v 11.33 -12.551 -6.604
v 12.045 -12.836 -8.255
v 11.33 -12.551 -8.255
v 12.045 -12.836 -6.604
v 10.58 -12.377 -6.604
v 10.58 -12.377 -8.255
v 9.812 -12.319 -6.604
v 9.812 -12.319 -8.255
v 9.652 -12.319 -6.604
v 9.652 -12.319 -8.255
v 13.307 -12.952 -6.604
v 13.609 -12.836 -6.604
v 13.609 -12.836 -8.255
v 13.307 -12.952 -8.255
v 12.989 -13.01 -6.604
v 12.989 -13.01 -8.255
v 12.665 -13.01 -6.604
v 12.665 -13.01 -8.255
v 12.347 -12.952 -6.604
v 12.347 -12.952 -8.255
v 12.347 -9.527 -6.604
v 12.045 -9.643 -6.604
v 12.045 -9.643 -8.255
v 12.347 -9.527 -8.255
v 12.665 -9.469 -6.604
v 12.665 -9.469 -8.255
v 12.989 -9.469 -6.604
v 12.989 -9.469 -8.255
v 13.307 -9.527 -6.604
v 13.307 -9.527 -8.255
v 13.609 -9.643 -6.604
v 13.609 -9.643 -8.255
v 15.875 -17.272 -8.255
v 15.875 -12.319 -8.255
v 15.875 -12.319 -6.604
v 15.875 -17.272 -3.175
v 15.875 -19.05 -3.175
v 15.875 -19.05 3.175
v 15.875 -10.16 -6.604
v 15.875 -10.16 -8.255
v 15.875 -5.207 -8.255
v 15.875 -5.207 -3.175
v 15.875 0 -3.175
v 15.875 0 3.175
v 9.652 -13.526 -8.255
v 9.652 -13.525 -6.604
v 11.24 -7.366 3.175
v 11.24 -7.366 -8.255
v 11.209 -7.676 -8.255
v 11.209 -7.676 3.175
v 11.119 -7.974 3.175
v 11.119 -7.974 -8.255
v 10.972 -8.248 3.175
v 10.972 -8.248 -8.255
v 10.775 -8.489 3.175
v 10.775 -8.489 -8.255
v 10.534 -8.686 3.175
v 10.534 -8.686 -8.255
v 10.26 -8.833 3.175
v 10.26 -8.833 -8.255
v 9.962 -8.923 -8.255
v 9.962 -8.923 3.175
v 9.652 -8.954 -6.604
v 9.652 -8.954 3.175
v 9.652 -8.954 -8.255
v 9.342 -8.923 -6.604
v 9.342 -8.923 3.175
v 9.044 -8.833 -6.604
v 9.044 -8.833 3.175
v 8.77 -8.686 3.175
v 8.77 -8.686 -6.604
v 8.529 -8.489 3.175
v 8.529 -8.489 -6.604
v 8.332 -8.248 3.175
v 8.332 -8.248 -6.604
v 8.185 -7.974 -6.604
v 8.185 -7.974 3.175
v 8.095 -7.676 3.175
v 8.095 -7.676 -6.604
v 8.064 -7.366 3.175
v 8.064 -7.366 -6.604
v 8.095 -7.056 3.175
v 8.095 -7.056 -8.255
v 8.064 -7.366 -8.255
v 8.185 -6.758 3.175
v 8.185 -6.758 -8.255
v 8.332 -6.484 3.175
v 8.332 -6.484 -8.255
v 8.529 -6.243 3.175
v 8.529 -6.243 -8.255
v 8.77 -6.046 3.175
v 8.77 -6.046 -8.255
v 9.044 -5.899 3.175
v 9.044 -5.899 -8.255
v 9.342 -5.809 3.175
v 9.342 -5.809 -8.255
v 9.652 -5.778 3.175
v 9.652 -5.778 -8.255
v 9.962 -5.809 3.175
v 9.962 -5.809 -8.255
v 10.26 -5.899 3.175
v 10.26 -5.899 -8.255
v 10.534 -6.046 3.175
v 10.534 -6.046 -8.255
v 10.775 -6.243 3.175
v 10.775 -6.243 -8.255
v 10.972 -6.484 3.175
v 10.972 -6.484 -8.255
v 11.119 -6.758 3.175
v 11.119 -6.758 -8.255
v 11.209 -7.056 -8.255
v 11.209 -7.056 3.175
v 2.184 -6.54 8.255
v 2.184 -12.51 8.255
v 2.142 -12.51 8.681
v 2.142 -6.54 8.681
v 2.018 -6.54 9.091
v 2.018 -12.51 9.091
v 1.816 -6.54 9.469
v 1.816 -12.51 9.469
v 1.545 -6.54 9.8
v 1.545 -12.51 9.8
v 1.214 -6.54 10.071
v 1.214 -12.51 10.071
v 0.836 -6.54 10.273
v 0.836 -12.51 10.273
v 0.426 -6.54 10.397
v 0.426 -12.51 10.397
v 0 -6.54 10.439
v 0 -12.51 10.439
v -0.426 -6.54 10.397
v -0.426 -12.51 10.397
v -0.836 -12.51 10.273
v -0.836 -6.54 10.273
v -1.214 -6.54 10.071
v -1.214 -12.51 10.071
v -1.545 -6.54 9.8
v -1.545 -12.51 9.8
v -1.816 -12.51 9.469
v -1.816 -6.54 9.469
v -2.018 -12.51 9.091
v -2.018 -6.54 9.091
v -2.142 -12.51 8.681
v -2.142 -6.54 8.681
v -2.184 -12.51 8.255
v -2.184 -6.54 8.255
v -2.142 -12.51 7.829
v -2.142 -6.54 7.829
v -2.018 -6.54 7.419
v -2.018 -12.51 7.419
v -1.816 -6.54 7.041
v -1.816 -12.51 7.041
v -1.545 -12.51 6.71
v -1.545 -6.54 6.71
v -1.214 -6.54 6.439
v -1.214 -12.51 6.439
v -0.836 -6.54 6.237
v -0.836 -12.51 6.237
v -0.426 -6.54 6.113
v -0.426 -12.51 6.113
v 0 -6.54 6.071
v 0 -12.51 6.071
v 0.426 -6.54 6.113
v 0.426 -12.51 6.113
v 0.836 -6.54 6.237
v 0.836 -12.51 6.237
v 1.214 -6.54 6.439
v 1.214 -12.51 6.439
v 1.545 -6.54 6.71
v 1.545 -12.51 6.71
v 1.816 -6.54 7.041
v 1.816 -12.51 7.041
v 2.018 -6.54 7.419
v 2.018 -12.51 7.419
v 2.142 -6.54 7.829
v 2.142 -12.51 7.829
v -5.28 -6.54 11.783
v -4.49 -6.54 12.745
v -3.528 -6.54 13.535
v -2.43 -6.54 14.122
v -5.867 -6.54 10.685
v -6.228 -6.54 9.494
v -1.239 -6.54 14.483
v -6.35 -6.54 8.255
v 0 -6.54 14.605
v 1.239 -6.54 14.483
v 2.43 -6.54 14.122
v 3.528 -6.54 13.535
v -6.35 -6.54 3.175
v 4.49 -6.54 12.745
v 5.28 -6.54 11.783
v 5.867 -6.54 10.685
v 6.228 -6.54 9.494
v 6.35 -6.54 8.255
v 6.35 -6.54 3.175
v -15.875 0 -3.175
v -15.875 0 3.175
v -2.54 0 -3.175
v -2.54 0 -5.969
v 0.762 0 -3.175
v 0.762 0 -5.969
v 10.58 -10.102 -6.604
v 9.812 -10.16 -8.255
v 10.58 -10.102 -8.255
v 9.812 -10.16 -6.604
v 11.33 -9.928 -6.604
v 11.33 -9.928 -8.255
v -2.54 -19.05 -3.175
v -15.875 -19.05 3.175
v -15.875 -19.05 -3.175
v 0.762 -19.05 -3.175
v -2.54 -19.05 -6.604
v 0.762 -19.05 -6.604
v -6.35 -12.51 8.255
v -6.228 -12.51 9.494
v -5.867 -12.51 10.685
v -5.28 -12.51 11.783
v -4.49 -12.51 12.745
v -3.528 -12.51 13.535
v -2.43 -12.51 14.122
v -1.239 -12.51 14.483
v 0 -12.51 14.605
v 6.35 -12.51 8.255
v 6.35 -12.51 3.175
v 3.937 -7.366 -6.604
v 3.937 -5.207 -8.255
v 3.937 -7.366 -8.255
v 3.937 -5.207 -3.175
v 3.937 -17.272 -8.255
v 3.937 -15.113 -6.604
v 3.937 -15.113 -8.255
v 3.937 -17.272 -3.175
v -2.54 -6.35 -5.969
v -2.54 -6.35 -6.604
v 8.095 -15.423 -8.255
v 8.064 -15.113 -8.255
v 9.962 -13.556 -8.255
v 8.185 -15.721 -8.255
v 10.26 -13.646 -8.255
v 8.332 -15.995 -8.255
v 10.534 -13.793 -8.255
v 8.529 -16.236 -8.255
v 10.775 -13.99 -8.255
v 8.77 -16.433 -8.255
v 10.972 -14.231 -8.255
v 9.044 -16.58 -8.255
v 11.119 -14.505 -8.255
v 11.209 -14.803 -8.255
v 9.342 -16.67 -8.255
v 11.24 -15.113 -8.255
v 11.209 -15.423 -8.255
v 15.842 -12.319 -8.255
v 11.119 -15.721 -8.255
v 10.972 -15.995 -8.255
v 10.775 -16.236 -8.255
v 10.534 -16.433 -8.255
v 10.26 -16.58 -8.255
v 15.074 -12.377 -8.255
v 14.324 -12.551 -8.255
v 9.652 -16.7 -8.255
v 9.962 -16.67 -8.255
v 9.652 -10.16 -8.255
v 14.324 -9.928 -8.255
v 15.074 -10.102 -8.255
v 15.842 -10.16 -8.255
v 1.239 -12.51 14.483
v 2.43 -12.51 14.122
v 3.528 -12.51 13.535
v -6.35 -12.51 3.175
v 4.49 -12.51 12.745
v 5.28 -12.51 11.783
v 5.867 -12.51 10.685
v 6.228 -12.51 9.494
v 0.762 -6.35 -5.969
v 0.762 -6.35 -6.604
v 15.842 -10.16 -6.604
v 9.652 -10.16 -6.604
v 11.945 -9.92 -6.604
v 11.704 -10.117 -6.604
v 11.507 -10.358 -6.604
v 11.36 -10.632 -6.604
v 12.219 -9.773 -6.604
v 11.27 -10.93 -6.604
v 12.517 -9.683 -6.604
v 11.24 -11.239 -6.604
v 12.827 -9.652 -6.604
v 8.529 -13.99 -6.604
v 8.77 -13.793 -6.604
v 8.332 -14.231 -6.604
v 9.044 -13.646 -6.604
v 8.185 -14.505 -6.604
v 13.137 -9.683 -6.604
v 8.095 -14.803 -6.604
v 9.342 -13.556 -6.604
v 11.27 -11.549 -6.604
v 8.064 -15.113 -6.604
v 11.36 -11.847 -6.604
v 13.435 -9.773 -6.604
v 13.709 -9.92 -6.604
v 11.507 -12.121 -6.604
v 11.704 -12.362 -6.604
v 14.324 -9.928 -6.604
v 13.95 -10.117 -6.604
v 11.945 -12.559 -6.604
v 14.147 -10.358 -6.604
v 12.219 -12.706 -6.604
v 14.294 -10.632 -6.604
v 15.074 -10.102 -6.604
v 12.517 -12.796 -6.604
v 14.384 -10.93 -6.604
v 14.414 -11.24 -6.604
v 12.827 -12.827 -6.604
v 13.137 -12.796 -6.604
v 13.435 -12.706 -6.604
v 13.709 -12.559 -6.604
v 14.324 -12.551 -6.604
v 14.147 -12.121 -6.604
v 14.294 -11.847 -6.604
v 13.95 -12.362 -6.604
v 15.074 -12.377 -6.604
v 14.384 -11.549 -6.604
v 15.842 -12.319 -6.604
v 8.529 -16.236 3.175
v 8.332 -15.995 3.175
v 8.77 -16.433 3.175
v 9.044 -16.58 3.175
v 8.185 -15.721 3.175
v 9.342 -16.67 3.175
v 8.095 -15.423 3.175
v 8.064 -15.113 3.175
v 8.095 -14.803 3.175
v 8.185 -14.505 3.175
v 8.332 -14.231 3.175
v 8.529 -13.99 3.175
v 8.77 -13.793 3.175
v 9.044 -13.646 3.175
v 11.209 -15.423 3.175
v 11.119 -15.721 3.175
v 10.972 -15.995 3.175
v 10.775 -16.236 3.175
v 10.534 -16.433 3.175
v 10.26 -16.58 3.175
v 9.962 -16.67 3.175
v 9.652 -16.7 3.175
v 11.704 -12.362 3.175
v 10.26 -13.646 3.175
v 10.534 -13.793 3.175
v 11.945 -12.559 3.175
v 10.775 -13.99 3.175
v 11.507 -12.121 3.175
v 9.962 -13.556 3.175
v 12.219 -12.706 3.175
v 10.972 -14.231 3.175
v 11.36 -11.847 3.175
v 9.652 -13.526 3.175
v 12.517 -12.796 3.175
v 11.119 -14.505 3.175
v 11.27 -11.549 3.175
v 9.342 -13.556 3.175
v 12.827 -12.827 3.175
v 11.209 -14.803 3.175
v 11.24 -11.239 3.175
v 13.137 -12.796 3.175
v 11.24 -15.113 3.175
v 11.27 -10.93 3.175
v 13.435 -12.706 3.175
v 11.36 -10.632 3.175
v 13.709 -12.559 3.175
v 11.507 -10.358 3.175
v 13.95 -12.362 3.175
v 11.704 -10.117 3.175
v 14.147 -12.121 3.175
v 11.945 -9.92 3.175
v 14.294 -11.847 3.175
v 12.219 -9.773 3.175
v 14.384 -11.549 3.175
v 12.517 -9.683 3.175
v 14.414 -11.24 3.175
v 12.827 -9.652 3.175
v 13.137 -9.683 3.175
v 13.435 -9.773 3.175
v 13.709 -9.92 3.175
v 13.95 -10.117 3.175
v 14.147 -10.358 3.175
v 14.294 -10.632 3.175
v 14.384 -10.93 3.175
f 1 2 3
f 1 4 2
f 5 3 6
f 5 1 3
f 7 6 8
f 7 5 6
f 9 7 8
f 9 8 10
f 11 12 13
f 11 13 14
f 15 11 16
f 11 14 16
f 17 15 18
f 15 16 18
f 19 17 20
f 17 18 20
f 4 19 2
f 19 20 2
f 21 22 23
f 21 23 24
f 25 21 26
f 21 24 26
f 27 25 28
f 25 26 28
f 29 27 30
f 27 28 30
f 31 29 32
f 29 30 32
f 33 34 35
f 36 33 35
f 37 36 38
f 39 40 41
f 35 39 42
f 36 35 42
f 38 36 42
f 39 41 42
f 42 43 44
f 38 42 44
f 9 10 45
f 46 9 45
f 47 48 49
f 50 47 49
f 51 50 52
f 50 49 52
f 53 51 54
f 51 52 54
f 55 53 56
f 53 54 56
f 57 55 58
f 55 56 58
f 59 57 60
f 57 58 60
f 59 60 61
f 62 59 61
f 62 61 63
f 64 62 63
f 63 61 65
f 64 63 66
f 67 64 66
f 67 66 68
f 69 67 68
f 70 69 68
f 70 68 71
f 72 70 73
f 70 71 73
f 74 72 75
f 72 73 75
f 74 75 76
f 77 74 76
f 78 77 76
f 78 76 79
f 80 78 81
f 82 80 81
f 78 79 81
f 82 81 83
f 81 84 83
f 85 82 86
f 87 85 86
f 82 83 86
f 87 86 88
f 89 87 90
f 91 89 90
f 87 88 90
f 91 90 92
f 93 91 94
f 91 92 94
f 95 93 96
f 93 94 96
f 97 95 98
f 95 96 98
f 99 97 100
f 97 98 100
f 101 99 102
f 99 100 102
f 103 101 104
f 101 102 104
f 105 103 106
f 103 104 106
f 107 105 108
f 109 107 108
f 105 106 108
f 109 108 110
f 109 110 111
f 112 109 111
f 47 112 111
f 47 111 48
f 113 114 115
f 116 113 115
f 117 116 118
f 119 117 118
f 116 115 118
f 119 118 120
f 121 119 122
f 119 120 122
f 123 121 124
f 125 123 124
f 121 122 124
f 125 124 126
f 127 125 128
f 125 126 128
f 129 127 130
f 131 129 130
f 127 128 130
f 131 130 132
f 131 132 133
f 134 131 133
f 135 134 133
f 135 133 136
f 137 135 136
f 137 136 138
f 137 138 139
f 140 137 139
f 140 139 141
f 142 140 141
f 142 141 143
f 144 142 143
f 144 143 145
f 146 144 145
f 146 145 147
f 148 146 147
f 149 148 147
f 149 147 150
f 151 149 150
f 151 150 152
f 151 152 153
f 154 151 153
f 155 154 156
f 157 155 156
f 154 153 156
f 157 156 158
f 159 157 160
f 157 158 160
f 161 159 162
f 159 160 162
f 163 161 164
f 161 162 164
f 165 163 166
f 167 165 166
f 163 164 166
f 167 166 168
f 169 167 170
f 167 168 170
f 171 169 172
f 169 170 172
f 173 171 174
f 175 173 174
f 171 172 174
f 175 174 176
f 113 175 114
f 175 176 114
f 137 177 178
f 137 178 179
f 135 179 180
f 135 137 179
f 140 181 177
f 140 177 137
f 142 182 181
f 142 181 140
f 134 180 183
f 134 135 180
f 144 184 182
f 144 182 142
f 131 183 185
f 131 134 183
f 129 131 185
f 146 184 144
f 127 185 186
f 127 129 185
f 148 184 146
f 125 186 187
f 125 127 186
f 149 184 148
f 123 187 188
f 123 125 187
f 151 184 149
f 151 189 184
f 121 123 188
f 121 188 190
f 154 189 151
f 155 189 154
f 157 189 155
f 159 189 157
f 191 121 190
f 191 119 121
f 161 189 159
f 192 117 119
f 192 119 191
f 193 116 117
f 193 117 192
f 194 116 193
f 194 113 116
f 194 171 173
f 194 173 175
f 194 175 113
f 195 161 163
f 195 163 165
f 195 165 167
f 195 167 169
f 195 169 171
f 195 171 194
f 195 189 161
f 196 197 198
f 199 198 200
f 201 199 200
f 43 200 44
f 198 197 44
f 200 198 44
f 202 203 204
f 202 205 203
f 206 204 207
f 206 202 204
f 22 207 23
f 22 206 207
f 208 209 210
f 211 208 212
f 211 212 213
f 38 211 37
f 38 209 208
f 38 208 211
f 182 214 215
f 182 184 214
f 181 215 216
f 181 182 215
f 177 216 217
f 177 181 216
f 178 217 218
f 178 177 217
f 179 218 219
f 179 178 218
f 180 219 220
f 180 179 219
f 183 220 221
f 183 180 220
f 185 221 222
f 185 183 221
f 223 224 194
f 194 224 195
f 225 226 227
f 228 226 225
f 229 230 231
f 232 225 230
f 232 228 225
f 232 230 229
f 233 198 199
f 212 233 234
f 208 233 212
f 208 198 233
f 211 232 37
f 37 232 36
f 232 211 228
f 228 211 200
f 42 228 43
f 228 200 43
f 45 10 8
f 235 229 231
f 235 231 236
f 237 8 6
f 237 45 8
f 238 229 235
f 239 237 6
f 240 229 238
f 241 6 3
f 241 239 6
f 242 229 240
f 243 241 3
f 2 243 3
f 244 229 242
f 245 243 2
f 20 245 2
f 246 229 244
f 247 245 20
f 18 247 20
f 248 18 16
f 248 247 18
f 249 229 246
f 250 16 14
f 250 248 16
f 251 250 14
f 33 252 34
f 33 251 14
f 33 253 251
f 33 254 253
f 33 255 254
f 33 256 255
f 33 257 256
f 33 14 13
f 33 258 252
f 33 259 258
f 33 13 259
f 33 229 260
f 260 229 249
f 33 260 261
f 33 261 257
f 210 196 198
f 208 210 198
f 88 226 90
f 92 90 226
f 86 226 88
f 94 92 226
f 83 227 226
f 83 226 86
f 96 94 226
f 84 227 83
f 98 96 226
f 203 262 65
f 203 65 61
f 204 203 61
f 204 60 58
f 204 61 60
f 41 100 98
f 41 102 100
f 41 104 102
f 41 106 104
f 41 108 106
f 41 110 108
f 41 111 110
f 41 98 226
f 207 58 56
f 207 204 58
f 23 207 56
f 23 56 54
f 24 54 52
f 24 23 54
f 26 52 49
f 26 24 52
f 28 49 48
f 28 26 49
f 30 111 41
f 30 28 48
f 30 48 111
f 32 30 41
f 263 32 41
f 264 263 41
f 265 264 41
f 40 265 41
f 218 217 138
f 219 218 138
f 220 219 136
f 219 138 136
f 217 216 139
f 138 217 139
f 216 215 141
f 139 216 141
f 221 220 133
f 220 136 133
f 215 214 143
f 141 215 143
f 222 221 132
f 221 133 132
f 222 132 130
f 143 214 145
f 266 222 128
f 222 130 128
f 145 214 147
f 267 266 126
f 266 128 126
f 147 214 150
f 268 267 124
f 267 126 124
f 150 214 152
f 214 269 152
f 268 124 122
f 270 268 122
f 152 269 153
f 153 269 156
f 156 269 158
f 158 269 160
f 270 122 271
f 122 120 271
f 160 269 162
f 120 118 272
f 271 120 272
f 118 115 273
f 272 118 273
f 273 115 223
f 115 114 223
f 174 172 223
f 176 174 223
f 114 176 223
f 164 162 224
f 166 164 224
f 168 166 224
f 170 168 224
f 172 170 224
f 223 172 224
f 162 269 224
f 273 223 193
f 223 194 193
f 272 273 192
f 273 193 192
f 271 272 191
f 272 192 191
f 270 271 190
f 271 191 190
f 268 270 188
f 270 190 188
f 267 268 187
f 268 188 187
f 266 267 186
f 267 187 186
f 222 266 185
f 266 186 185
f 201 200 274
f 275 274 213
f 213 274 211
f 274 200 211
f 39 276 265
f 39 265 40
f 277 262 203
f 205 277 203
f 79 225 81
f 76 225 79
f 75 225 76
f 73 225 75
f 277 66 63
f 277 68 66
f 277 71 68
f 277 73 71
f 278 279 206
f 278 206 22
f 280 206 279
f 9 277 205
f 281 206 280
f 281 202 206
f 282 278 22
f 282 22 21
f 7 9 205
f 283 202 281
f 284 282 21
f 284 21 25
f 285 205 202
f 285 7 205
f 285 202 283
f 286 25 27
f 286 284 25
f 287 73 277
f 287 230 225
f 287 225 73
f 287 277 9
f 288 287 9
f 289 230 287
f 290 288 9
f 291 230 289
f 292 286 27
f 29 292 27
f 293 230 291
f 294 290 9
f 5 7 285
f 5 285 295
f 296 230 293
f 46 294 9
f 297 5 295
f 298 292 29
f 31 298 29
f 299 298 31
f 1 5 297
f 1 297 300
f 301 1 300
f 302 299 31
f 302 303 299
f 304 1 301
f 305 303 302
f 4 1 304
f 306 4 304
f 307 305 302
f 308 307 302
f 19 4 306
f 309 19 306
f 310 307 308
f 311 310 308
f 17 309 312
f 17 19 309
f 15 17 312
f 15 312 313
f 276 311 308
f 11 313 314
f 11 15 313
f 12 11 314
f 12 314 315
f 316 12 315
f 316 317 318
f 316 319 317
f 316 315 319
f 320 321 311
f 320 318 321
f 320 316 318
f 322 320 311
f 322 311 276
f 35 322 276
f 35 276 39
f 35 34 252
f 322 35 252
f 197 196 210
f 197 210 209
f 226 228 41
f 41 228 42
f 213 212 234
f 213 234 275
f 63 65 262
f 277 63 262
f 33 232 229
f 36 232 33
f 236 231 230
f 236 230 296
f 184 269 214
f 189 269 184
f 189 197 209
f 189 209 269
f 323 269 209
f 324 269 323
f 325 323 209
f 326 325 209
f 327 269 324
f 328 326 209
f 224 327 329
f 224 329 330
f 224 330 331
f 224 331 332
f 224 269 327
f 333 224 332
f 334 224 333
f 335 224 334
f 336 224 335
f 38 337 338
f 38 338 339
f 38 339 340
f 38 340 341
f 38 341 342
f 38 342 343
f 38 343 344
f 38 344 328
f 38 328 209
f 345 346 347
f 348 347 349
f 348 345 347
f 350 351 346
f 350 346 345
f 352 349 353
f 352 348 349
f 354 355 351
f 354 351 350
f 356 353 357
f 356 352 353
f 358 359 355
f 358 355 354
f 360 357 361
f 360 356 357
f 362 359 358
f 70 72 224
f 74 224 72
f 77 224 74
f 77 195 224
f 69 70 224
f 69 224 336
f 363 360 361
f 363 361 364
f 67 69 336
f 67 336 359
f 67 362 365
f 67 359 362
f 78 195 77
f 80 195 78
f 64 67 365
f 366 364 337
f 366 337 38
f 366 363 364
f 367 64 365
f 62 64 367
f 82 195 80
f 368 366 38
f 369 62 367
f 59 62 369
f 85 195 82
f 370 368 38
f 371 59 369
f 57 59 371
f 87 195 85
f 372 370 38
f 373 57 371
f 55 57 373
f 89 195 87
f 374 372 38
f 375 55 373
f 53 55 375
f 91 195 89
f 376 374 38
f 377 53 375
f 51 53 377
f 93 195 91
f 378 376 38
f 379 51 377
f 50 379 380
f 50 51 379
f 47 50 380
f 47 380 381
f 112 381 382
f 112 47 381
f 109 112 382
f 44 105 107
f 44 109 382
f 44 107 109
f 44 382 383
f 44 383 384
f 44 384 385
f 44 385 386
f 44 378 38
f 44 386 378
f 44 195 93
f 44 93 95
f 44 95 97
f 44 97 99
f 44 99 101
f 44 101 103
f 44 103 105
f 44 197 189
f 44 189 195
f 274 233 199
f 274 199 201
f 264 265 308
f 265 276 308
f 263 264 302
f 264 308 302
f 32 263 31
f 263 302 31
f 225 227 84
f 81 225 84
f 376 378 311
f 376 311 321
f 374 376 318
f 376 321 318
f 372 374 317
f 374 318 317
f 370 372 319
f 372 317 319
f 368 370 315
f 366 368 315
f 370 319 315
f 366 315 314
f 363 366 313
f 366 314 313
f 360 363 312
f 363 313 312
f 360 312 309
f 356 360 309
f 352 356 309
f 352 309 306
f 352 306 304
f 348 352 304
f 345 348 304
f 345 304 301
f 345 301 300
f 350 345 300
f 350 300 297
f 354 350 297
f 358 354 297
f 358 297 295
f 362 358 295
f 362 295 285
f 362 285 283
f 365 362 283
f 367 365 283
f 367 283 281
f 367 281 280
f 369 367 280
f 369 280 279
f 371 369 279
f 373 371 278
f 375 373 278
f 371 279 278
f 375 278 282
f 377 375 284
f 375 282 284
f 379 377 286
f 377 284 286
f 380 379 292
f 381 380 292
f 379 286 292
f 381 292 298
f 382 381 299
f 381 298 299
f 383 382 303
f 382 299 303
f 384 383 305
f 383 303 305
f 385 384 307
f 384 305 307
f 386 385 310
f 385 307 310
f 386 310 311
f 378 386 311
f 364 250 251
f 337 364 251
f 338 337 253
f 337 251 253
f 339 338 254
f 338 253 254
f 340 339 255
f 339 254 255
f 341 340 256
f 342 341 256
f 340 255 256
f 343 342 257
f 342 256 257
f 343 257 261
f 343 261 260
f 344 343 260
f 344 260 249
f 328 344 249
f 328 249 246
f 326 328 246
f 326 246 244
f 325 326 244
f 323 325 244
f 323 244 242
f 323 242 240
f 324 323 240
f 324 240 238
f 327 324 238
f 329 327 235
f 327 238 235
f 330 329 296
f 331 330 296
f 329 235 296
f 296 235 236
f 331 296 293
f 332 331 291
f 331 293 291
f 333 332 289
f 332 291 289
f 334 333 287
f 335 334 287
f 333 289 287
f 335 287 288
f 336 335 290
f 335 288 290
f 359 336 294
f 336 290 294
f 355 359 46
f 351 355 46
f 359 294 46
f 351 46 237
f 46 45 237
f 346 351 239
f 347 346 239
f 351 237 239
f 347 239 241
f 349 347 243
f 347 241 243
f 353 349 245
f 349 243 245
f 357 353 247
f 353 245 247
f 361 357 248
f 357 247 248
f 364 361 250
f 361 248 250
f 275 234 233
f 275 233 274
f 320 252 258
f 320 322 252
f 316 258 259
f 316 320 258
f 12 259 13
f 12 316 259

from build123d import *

# Parameters (mm, degrees)
F0_W      = 31.75
F0_H      = 6.35
F1_DEPTH  = 19.05
F2_W      = 12.7
F2_H      = 5.969
F3_DEPTH  = 11.43
F4_R      = 6.34999
F5_R      = 2.1844
F6_DEPTH  = 25.4
F7_W      = 11.938
F7_H      = 12.065
F8_DEPTH  = 5.08
F9_W      = 5.715
F9_H      = 7.747
F10_DEPTH = 1.651
F11_R     = 1.5875
F12_DEPTH = 25.4
F13_W     = 3.302
F13_H     = 19.05
F14_DEPTH = 3.429
F15_W     = 3.302
F15_H     = 6.35
F16_DEPTH = 0.635
F18_DEPTH = 1.651
F19_R     = 5.08


# Not quite as in the source:
# - a fillet or chamfer is up to 0.001 mm smaller than in the source, because OpenCascade refuses the exact size


with BuildPart() as f1:
    # F0 (on Front) → F1 (new body)
    with BuildSketch(Plane.XZ):
        Rectangle(F0_W, F0_H)
    extrude(amount=F1_DEPTH)

    # F2 (on face) → F3 (join)
    with BuildSketch(Plane.XY.offset(3.175)):
        with Locations((0, -9.525)):
            Rectangle(F2_W, F2_H)
    extrude(amount=F3_DEPTH)

    # F4 (radius 6.35 in the source; OpenCascade refuses exactly that, so slightly less here)
    f4_edges = [f1.edges().sort_by_distance(p)[0] for p in [
        (-6.35, -9.525, 14.605),
        (6.35, -9.525, 14.605),
    ]]
    fillet(f4_edges, radius=F4_R)

    # F5 (on face) → F6 (cut)
    with BuildSketch(Plane.XZ.offset(12.5095)):
        with Locations((0, 8.255)):
            Circle(F5_R)
    extrude(amount=-F6_DEPTH, mode=Mode.SUBTRACT)

    # F7 (on face) → F8 (join)
    with BuildSketch(Plane(origin=(0, 0, -3.175), x_dir=(1, 0, 0), z_dir=(0, 0, -1))):
        with Locations((9.906, 11.2395)):
            Rectangle(F7_W, F7_H)
    extrude(amount=F8_DEPTH)

    # F9 (on face) → F10 (cut)
    with BuildSketch(Plane(origin=(0, 0, -8.255), x_dir=(1, 0, 0), z_dir=(0, 0, -1))):
        with Locations((6.7945, 11.2395)):
            Rectangle(F9_W, F9_H)
    extrude(amount=-F10_DEPTH, mode=Mode.SUBTRACT)

    # F11 (on face) → F12 (cut)
    with BuildSketch(Plane(origin=(0, 0, -8.255), x_dir=(1, 0, 0), z_dir=(0, 0, -1))):
        with Locations((9.652, 15.113)):
            Circle(F11_R)
        with Locations((9.652, 7.366)):
            Circle(F11_R)
        with Locations((12.827, 11.2395)):
            Circle(F11_R)
    extrude(amount=-F12_DEPTH, mode=Mode.SUBTRACT)

    # F13 (on face) → F14 (join)
    with BuildSketch(Plane(origin=(0, 0, -3.175), x_dir=(1, 0, 0), z_dir=(0, 0, -1))):
        with Locations((-0.889, 9.525)):
            Rectangle(F13_W, F13_H)
    extrude(amount=F14_DEPTH)

    # F15 (on face) → F16 (cut)
    with BuildSketch(Plane(origin=(0, 0, -6.604), x_dir=(1, 0, 0), z_dir=(0, 0, -1))):
        with Locations((-0.889, 3.175)):
            Rectangle(F15_W, F15_H)
    extrude(amount=-F16_DEPTH, mode=Mode.SUBTRACT)

    # F17 (on face) → F18 (cut)
    with BuildSketch(Plane(origin=(0, 0, -8.255), x_dir=(1, 0, 0), z_dir=(0, 0, -1))):
        with BuildLine():
            Line((11.4142141882, 12.319), (9.652, 12.319))
            Line((9.652, 12.319), (9.652, 10.16))
            Line((9.652, 10.16), (11.4142141882, 10.16))
            ThreePointArc((11.4142141882, 10.16), (12.827, 9.4615), (14.2397858118, 10.16))
            Line((14.2397858118, 10.16), (15.875, 10.16))
            Line((15.875, 10.16), (15.875, 12.319))
            Line((15.875, 12.319), (14.2397858118, 12.319))
            ThreePointArc((14.2397858118, 12.319), (12.827, 13.0175), (11.4142141882, 12.319))
        make_face()
    extrude(amount=-F18_DEPTH, mode=Mode.SUBTRACT)

    # F19
    f19_edges = [f1.edges().sort_by_distance(p)[0] for p in [
        (11.414214, -12.319, -7.4295),
        (14.239786, -12.319, -7.4295),
        (11.414214, -10.16, -7.4295),
        (14.239786, -10.16, -7.4295),
    ]]
    fillet(f19_edges, radius=F19_R)


solid = f1.part
